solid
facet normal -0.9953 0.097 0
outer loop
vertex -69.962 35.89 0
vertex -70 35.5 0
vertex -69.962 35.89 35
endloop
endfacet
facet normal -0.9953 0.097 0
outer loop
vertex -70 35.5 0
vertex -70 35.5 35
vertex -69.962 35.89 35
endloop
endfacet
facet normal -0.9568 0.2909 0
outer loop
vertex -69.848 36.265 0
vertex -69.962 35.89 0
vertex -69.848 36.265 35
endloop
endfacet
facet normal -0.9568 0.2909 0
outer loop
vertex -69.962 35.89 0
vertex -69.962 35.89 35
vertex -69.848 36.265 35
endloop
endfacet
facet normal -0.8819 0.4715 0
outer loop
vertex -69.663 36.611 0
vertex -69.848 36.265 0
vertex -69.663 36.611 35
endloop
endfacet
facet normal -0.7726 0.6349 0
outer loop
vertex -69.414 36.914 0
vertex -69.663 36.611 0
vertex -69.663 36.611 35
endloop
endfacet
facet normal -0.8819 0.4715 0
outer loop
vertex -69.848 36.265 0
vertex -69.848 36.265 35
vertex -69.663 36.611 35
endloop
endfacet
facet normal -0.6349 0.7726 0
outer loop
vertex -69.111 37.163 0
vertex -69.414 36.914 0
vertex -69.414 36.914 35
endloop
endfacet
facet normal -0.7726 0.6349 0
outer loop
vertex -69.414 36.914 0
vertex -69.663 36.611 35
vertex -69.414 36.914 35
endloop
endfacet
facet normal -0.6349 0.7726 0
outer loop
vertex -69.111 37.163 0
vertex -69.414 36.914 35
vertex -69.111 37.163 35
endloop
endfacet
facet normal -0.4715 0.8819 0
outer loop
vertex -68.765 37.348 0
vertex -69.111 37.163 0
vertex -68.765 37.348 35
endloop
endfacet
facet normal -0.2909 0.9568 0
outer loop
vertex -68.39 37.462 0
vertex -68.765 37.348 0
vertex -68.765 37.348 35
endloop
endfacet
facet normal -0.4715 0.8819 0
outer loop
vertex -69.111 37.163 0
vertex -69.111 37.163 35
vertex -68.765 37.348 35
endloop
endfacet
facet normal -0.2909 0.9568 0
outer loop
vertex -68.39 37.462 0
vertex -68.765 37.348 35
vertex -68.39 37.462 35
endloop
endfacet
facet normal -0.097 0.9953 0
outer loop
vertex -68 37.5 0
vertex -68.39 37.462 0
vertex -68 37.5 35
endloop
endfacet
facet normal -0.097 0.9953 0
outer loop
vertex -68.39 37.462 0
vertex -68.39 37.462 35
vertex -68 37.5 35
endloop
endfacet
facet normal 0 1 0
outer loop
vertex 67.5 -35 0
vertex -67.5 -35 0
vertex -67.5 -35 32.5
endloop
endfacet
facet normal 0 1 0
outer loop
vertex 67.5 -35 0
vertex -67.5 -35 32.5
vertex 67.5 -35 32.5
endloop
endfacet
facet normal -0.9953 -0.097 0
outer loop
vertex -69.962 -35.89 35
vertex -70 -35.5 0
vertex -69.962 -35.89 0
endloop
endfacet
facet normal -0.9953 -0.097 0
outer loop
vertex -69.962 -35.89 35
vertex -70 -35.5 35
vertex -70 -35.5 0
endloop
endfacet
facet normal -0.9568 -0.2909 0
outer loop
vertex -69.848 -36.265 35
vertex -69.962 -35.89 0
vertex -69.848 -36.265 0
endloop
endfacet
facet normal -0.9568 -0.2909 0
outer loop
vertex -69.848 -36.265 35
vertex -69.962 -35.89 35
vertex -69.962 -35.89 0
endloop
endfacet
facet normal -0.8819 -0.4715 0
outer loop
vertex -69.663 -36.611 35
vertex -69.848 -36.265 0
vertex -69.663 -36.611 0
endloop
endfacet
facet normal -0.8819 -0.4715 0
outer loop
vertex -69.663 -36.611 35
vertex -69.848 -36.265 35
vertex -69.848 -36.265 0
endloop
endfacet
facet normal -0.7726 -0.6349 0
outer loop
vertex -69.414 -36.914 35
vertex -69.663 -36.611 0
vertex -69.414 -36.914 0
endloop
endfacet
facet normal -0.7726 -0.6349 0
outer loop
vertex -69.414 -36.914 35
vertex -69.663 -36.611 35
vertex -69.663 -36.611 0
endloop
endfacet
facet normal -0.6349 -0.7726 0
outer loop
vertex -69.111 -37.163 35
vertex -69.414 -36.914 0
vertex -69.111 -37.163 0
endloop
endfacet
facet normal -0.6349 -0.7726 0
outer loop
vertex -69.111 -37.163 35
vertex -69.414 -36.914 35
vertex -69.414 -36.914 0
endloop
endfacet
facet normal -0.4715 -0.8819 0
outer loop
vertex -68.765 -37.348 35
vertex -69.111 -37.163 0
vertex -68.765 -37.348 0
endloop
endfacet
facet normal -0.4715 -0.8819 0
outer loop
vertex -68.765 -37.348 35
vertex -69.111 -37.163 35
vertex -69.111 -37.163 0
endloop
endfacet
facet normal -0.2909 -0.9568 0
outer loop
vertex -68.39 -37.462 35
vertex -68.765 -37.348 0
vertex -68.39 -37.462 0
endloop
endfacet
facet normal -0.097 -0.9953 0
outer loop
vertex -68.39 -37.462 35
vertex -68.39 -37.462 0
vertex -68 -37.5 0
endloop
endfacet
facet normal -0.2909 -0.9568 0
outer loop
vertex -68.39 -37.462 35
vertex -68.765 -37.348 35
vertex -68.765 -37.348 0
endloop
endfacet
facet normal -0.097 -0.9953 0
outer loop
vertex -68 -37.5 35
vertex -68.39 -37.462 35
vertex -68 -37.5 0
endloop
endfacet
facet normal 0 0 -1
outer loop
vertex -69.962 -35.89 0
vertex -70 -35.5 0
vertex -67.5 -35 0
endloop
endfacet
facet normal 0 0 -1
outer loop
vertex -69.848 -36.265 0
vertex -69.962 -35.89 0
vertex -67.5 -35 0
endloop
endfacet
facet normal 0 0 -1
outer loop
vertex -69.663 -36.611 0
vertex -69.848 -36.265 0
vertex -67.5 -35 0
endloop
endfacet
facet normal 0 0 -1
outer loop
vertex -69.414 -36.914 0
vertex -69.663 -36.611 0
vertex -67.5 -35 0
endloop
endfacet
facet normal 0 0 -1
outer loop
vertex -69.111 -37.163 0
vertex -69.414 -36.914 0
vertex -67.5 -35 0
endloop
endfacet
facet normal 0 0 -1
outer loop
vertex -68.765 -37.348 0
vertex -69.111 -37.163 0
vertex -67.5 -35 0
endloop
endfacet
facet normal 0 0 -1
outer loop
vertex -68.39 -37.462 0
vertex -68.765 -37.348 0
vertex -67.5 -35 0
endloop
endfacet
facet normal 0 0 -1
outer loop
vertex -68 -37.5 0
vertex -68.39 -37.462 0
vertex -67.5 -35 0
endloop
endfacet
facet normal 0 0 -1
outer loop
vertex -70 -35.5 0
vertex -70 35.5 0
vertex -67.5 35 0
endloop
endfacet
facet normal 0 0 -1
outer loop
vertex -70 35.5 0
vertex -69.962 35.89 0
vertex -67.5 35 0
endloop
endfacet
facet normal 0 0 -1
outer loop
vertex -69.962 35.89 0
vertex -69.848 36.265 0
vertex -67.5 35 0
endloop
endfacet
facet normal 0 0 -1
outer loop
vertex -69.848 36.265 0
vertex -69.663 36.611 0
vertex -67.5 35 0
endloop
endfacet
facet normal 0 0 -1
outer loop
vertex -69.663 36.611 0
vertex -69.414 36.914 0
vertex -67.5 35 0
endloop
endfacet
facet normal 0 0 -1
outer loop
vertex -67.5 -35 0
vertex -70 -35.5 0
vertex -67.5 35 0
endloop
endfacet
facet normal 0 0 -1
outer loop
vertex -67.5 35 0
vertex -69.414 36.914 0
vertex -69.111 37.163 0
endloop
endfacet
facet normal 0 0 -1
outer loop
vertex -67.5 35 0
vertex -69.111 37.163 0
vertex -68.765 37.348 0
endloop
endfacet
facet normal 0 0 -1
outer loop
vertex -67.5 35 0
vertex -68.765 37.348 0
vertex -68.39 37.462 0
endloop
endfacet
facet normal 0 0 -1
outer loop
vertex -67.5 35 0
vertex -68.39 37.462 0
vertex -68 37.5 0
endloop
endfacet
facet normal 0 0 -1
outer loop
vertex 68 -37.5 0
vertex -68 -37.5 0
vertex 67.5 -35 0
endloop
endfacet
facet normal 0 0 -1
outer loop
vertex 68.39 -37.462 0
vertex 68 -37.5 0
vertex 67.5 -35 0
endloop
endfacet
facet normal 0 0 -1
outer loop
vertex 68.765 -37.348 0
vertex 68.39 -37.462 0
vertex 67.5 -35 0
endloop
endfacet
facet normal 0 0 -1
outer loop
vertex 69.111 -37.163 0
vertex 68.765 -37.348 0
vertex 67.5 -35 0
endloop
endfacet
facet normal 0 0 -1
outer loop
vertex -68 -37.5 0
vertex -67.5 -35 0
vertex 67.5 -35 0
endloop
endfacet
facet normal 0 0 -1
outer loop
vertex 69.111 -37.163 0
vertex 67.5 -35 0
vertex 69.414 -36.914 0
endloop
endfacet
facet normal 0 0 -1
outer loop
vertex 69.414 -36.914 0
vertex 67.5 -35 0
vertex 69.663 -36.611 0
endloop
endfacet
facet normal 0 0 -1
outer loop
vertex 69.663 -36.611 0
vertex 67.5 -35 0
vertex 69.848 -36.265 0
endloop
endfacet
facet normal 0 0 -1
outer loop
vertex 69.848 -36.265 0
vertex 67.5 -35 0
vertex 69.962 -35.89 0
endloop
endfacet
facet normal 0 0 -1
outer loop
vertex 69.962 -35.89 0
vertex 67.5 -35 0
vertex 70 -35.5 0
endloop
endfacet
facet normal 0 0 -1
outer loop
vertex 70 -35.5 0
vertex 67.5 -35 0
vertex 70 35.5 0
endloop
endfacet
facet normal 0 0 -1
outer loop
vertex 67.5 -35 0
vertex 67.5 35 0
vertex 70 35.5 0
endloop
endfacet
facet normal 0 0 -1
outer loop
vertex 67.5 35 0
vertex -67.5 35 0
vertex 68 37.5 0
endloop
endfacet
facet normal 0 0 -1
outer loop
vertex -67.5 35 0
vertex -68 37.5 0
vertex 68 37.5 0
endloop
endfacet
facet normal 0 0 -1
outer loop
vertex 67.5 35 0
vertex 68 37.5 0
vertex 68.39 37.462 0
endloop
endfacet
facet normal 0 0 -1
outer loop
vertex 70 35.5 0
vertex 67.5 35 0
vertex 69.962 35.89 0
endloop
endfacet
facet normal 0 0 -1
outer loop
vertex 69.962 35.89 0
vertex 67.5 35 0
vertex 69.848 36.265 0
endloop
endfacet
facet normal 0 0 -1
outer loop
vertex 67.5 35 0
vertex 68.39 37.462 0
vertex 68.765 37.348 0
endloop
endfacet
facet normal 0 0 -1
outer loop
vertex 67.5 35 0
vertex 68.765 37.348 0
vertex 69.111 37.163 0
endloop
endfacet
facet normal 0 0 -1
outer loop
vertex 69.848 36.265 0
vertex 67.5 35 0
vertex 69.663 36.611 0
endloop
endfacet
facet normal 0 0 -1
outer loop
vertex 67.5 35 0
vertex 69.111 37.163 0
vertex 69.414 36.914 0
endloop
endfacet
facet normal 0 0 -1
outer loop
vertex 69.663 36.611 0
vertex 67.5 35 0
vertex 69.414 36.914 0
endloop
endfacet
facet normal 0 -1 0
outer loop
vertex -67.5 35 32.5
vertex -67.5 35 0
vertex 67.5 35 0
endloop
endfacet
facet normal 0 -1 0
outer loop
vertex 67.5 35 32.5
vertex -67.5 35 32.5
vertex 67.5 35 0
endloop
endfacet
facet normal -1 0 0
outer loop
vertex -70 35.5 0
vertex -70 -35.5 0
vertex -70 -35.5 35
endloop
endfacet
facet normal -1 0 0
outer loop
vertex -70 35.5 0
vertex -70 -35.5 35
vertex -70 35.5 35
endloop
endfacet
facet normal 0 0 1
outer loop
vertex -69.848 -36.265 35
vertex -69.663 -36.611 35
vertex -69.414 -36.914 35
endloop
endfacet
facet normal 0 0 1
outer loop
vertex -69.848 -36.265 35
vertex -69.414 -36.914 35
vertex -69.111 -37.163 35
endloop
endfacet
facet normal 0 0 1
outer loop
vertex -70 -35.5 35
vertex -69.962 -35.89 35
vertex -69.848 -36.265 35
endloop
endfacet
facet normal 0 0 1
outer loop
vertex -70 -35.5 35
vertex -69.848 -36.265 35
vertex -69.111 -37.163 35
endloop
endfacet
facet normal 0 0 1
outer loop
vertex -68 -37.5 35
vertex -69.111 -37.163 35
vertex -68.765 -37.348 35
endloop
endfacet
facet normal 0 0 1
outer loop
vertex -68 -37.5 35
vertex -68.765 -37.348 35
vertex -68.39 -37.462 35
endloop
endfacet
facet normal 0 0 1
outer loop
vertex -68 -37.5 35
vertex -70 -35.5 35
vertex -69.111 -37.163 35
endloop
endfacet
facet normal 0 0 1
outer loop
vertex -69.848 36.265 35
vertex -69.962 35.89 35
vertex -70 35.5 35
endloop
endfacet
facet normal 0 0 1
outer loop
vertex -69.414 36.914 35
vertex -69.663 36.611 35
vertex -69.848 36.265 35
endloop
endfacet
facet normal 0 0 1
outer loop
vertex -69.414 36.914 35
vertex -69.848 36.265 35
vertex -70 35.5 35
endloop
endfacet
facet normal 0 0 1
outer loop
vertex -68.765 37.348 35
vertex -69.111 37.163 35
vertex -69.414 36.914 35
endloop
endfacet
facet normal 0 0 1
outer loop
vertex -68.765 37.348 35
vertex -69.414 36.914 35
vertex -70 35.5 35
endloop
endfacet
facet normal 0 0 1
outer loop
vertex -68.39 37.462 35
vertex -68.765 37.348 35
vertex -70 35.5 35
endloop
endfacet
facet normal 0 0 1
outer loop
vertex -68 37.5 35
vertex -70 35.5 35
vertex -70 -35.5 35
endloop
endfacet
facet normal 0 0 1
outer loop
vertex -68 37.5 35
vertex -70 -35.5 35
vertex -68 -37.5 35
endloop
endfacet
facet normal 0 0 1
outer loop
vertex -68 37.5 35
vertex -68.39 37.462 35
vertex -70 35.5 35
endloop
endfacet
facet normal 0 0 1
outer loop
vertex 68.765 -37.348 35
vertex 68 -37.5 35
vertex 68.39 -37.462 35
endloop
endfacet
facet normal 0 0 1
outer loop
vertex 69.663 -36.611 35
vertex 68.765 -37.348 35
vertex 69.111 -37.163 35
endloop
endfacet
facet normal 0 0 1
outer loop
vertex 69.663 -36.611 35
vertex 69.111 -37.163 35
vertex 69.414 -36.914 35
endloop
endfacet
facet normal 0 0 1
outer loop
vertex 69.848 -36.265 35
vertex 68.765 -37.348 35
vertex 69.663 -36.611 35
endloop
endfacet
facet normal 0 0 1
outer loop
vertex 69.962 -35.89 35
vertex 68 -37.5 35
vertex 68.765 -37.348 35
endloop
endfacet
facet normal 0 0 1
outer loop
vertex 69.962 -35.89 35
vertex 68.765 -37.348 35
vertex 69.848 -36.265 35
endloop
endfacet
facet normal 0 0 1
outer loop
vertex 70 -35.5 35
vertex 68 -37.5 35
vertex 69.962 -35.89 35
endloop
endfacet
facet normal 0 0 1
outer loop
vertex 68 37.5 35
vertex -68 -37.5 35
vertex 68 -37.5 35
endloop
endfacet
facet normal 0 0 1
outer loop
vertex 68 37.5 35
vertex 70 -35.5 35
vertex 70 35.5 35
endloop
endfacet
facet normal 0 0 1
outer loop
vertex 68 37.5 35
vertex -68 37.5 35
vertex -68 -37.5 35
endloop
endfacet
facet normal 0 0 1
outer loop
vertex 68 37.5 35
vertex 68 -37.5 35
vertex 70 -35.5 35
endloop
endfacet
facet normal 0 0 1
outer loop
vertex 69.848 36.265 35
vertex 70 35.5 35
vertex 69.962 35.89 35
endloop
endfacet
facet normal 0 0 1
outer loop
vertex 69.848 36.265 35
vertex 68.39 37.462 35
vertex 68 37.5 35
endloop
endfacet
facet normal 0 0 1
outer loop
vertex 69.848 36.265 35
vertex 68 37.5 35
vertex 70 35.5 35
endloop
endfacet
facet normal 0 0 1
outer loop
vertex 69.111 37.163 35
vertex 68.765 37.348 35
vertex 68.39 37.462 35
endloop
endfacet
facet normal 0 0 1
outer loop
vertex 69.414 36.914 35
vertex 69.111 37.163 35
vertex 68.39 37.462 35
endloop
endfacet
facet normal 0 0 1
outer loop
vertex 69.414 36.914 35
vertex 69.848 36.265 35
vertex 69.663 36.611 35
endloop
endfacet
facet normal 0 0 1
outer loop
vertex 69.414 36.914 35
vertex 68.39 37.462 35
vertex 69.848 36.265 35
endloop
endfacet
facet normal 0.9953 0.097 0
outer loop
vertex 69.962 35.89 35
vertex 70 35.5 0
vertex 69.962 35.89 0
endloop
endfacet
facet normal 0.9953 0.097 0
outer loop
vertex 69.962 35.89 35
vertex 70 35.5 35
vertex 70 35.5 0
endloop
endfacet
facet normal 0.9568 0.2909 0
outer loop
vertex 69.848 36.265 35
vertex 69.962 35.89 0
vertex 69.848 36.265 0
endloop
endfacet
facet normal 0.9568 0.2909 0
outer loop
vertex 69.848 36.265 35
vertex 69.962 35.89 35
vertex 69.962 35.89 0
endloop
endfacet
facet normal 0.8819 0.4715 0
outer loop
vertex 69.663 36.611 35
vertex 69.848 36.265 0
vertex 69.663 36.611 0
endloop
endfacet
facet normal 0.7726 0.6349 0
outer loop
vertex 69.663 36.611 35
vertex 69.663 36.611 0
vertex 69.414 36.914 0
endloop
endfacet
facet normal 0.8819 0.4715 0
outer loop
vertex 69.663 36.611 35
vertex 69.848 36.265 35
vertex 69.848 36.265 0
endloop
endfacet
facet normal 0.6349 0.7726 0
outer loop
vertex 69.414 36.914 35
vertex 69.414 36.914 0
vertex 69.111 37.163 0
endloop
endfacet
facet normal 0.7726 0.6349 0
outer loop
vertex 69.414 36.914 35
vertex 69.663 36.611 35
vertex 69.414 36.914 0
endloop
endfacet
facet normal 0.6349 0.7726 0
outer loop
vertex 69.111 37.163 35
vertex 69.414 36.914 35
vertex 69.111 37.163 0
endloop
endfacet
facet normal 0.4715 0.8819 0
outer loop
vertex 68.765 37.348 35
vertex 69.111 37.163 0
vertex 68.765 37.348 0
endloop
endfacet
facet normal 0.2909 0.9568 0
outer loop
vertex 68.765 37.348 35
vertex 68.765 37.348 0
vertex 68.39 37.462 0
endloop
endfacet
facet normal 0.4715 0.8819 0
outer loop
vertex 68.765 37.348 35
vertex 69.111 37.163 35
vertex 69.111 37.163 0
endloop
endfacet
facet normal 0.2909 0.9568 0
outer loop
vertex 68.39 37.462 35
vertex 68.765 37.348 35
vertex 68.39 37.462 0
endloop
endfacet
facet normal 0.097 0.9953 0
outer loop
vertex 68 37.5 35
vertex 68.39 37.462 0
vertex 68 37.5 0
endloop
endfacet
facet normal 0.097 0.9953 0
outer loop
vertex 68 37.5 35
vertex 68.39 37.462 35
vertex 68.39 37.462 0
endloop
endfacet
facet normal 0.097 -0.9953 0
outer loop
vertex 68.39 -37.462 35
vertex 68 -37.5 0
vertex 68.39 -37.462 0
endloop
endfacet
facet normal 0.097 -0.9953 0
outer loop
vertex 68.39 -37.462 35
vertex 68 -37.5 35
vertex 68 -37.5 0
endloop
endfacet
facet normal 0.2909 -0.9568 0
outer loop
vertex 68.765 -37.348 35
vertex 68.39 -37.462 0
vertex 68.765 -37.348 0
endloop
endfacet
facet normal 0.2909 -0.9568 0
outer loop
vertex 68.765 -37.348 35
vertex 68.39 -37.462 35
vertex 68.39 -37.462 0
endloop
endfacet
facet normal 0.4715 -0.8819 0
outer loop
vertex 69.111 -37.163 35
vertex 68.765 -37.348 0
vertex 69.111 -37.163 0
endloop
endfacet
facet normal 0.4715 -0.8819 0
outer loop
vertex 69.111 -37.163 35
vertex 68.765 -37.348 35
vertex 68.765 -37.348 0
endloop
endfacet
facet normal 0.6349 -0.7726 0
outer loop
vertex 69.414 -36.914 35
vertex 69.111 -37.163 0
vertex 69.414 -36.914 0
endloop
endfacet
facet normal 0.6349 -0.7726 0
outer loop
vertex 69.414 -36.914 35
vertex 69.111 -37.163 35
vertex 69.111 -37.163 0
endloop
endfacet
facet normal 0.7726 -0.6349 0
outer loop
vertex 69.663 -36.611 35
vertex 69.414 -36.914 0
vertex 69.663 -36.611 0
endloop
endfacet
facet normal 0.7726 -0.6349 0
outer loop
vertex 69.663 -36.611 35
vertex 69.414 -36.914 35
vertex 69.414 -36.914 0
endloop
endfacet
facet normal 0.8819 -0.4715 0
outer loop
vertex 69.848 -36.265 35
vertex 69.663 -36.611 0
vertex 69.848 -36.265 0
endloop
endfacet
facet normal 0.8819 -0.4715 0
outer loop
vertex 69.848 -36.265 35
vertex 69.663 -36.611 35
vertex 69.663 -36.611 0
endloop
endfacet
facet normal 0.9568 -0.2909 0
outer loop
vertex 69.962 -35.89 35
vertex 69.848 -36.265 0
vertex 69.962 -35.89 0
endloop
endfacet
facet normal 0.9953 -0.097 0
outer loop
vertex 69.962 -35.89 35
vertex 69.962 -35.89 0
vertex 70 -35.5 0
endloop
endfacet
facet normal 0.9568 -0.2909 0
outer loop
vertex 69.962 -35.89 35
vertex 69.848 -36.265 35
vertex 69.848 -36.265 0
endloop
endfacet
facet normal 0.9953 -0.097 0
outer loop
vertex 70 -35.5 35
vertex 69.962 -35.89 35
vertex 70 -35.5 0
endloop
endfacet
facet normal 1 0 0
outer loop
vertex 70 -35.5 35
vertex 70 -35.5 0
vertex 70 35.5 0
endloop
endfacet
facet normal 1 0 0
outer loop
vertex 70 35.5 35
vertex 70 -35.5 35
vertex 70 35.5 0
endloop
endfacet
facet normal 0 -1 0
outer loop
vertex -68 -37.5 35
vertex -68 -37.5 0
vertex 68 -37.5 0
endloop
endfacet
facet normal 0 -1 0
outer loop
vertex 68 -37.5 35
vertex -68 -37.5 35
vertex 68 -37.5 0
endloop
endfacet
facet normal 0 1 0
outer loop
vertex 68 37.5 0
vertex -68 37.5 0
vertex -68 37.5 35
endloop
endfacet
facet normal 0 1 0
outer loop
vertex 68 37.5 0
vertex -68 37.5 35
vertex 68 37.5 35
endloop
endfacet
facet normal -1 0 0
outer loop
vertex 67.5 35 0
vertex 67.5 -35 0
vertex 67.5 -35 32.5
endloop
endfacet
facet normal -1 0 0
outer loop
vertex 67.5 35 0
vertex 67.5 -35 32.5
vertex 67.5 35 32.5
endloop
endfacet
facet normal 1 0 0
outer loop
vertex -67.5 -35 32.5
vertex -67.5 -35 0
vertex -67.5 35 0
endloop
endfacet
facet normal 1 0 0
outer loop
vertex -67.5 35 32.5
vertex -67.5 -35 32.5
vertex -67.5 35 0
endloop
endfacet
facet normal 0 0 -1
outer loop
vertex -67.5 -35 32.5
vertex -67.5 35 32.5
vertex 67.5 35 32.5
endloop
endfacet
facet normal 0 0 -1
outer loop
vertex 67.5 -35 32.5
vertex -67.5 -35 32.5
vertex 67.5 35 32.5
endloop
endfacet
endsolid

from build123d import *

# Parameters (mm, degrees)
SKETCH1_W           = 140
SKETCH1_H           = 75
BOSS_EXTRUDE1_DEPTH = 35
SHELL1_T            = -2.5
FILLET1_R           = 2


with BuildPart() as part:
    # Sketch1 → Boss-Extrude1 (new body)
    with BuildSketch(Plane.XY):
        Rectangle(SKETCH1_W, SKETCH1_H)
    extrude(amount=BOSS_EXTRUDE1_DEPTH)

    # Shell1
    shell1_openings = [part.faces().sort_by_distance(p)[0] for p in [
        (0, 0, 0),
    ]]
    offset(amount=SHELL1_T, openings=shell1_openings, kind=Kind.INTERSECTION)

    # Fillet1
    fillet1_edges = [part.edges().sort_by_distance(p)[0] for p in [
        (70, -37.5, 17.5),
        (-70, -37.5, 17.5),
        (-70, 37.5, 17.5),
        (70, 37.5, 17.5),
    ]]
    fillet(fillet1_edges, radius=FILLET1_R)


solid = part.part
